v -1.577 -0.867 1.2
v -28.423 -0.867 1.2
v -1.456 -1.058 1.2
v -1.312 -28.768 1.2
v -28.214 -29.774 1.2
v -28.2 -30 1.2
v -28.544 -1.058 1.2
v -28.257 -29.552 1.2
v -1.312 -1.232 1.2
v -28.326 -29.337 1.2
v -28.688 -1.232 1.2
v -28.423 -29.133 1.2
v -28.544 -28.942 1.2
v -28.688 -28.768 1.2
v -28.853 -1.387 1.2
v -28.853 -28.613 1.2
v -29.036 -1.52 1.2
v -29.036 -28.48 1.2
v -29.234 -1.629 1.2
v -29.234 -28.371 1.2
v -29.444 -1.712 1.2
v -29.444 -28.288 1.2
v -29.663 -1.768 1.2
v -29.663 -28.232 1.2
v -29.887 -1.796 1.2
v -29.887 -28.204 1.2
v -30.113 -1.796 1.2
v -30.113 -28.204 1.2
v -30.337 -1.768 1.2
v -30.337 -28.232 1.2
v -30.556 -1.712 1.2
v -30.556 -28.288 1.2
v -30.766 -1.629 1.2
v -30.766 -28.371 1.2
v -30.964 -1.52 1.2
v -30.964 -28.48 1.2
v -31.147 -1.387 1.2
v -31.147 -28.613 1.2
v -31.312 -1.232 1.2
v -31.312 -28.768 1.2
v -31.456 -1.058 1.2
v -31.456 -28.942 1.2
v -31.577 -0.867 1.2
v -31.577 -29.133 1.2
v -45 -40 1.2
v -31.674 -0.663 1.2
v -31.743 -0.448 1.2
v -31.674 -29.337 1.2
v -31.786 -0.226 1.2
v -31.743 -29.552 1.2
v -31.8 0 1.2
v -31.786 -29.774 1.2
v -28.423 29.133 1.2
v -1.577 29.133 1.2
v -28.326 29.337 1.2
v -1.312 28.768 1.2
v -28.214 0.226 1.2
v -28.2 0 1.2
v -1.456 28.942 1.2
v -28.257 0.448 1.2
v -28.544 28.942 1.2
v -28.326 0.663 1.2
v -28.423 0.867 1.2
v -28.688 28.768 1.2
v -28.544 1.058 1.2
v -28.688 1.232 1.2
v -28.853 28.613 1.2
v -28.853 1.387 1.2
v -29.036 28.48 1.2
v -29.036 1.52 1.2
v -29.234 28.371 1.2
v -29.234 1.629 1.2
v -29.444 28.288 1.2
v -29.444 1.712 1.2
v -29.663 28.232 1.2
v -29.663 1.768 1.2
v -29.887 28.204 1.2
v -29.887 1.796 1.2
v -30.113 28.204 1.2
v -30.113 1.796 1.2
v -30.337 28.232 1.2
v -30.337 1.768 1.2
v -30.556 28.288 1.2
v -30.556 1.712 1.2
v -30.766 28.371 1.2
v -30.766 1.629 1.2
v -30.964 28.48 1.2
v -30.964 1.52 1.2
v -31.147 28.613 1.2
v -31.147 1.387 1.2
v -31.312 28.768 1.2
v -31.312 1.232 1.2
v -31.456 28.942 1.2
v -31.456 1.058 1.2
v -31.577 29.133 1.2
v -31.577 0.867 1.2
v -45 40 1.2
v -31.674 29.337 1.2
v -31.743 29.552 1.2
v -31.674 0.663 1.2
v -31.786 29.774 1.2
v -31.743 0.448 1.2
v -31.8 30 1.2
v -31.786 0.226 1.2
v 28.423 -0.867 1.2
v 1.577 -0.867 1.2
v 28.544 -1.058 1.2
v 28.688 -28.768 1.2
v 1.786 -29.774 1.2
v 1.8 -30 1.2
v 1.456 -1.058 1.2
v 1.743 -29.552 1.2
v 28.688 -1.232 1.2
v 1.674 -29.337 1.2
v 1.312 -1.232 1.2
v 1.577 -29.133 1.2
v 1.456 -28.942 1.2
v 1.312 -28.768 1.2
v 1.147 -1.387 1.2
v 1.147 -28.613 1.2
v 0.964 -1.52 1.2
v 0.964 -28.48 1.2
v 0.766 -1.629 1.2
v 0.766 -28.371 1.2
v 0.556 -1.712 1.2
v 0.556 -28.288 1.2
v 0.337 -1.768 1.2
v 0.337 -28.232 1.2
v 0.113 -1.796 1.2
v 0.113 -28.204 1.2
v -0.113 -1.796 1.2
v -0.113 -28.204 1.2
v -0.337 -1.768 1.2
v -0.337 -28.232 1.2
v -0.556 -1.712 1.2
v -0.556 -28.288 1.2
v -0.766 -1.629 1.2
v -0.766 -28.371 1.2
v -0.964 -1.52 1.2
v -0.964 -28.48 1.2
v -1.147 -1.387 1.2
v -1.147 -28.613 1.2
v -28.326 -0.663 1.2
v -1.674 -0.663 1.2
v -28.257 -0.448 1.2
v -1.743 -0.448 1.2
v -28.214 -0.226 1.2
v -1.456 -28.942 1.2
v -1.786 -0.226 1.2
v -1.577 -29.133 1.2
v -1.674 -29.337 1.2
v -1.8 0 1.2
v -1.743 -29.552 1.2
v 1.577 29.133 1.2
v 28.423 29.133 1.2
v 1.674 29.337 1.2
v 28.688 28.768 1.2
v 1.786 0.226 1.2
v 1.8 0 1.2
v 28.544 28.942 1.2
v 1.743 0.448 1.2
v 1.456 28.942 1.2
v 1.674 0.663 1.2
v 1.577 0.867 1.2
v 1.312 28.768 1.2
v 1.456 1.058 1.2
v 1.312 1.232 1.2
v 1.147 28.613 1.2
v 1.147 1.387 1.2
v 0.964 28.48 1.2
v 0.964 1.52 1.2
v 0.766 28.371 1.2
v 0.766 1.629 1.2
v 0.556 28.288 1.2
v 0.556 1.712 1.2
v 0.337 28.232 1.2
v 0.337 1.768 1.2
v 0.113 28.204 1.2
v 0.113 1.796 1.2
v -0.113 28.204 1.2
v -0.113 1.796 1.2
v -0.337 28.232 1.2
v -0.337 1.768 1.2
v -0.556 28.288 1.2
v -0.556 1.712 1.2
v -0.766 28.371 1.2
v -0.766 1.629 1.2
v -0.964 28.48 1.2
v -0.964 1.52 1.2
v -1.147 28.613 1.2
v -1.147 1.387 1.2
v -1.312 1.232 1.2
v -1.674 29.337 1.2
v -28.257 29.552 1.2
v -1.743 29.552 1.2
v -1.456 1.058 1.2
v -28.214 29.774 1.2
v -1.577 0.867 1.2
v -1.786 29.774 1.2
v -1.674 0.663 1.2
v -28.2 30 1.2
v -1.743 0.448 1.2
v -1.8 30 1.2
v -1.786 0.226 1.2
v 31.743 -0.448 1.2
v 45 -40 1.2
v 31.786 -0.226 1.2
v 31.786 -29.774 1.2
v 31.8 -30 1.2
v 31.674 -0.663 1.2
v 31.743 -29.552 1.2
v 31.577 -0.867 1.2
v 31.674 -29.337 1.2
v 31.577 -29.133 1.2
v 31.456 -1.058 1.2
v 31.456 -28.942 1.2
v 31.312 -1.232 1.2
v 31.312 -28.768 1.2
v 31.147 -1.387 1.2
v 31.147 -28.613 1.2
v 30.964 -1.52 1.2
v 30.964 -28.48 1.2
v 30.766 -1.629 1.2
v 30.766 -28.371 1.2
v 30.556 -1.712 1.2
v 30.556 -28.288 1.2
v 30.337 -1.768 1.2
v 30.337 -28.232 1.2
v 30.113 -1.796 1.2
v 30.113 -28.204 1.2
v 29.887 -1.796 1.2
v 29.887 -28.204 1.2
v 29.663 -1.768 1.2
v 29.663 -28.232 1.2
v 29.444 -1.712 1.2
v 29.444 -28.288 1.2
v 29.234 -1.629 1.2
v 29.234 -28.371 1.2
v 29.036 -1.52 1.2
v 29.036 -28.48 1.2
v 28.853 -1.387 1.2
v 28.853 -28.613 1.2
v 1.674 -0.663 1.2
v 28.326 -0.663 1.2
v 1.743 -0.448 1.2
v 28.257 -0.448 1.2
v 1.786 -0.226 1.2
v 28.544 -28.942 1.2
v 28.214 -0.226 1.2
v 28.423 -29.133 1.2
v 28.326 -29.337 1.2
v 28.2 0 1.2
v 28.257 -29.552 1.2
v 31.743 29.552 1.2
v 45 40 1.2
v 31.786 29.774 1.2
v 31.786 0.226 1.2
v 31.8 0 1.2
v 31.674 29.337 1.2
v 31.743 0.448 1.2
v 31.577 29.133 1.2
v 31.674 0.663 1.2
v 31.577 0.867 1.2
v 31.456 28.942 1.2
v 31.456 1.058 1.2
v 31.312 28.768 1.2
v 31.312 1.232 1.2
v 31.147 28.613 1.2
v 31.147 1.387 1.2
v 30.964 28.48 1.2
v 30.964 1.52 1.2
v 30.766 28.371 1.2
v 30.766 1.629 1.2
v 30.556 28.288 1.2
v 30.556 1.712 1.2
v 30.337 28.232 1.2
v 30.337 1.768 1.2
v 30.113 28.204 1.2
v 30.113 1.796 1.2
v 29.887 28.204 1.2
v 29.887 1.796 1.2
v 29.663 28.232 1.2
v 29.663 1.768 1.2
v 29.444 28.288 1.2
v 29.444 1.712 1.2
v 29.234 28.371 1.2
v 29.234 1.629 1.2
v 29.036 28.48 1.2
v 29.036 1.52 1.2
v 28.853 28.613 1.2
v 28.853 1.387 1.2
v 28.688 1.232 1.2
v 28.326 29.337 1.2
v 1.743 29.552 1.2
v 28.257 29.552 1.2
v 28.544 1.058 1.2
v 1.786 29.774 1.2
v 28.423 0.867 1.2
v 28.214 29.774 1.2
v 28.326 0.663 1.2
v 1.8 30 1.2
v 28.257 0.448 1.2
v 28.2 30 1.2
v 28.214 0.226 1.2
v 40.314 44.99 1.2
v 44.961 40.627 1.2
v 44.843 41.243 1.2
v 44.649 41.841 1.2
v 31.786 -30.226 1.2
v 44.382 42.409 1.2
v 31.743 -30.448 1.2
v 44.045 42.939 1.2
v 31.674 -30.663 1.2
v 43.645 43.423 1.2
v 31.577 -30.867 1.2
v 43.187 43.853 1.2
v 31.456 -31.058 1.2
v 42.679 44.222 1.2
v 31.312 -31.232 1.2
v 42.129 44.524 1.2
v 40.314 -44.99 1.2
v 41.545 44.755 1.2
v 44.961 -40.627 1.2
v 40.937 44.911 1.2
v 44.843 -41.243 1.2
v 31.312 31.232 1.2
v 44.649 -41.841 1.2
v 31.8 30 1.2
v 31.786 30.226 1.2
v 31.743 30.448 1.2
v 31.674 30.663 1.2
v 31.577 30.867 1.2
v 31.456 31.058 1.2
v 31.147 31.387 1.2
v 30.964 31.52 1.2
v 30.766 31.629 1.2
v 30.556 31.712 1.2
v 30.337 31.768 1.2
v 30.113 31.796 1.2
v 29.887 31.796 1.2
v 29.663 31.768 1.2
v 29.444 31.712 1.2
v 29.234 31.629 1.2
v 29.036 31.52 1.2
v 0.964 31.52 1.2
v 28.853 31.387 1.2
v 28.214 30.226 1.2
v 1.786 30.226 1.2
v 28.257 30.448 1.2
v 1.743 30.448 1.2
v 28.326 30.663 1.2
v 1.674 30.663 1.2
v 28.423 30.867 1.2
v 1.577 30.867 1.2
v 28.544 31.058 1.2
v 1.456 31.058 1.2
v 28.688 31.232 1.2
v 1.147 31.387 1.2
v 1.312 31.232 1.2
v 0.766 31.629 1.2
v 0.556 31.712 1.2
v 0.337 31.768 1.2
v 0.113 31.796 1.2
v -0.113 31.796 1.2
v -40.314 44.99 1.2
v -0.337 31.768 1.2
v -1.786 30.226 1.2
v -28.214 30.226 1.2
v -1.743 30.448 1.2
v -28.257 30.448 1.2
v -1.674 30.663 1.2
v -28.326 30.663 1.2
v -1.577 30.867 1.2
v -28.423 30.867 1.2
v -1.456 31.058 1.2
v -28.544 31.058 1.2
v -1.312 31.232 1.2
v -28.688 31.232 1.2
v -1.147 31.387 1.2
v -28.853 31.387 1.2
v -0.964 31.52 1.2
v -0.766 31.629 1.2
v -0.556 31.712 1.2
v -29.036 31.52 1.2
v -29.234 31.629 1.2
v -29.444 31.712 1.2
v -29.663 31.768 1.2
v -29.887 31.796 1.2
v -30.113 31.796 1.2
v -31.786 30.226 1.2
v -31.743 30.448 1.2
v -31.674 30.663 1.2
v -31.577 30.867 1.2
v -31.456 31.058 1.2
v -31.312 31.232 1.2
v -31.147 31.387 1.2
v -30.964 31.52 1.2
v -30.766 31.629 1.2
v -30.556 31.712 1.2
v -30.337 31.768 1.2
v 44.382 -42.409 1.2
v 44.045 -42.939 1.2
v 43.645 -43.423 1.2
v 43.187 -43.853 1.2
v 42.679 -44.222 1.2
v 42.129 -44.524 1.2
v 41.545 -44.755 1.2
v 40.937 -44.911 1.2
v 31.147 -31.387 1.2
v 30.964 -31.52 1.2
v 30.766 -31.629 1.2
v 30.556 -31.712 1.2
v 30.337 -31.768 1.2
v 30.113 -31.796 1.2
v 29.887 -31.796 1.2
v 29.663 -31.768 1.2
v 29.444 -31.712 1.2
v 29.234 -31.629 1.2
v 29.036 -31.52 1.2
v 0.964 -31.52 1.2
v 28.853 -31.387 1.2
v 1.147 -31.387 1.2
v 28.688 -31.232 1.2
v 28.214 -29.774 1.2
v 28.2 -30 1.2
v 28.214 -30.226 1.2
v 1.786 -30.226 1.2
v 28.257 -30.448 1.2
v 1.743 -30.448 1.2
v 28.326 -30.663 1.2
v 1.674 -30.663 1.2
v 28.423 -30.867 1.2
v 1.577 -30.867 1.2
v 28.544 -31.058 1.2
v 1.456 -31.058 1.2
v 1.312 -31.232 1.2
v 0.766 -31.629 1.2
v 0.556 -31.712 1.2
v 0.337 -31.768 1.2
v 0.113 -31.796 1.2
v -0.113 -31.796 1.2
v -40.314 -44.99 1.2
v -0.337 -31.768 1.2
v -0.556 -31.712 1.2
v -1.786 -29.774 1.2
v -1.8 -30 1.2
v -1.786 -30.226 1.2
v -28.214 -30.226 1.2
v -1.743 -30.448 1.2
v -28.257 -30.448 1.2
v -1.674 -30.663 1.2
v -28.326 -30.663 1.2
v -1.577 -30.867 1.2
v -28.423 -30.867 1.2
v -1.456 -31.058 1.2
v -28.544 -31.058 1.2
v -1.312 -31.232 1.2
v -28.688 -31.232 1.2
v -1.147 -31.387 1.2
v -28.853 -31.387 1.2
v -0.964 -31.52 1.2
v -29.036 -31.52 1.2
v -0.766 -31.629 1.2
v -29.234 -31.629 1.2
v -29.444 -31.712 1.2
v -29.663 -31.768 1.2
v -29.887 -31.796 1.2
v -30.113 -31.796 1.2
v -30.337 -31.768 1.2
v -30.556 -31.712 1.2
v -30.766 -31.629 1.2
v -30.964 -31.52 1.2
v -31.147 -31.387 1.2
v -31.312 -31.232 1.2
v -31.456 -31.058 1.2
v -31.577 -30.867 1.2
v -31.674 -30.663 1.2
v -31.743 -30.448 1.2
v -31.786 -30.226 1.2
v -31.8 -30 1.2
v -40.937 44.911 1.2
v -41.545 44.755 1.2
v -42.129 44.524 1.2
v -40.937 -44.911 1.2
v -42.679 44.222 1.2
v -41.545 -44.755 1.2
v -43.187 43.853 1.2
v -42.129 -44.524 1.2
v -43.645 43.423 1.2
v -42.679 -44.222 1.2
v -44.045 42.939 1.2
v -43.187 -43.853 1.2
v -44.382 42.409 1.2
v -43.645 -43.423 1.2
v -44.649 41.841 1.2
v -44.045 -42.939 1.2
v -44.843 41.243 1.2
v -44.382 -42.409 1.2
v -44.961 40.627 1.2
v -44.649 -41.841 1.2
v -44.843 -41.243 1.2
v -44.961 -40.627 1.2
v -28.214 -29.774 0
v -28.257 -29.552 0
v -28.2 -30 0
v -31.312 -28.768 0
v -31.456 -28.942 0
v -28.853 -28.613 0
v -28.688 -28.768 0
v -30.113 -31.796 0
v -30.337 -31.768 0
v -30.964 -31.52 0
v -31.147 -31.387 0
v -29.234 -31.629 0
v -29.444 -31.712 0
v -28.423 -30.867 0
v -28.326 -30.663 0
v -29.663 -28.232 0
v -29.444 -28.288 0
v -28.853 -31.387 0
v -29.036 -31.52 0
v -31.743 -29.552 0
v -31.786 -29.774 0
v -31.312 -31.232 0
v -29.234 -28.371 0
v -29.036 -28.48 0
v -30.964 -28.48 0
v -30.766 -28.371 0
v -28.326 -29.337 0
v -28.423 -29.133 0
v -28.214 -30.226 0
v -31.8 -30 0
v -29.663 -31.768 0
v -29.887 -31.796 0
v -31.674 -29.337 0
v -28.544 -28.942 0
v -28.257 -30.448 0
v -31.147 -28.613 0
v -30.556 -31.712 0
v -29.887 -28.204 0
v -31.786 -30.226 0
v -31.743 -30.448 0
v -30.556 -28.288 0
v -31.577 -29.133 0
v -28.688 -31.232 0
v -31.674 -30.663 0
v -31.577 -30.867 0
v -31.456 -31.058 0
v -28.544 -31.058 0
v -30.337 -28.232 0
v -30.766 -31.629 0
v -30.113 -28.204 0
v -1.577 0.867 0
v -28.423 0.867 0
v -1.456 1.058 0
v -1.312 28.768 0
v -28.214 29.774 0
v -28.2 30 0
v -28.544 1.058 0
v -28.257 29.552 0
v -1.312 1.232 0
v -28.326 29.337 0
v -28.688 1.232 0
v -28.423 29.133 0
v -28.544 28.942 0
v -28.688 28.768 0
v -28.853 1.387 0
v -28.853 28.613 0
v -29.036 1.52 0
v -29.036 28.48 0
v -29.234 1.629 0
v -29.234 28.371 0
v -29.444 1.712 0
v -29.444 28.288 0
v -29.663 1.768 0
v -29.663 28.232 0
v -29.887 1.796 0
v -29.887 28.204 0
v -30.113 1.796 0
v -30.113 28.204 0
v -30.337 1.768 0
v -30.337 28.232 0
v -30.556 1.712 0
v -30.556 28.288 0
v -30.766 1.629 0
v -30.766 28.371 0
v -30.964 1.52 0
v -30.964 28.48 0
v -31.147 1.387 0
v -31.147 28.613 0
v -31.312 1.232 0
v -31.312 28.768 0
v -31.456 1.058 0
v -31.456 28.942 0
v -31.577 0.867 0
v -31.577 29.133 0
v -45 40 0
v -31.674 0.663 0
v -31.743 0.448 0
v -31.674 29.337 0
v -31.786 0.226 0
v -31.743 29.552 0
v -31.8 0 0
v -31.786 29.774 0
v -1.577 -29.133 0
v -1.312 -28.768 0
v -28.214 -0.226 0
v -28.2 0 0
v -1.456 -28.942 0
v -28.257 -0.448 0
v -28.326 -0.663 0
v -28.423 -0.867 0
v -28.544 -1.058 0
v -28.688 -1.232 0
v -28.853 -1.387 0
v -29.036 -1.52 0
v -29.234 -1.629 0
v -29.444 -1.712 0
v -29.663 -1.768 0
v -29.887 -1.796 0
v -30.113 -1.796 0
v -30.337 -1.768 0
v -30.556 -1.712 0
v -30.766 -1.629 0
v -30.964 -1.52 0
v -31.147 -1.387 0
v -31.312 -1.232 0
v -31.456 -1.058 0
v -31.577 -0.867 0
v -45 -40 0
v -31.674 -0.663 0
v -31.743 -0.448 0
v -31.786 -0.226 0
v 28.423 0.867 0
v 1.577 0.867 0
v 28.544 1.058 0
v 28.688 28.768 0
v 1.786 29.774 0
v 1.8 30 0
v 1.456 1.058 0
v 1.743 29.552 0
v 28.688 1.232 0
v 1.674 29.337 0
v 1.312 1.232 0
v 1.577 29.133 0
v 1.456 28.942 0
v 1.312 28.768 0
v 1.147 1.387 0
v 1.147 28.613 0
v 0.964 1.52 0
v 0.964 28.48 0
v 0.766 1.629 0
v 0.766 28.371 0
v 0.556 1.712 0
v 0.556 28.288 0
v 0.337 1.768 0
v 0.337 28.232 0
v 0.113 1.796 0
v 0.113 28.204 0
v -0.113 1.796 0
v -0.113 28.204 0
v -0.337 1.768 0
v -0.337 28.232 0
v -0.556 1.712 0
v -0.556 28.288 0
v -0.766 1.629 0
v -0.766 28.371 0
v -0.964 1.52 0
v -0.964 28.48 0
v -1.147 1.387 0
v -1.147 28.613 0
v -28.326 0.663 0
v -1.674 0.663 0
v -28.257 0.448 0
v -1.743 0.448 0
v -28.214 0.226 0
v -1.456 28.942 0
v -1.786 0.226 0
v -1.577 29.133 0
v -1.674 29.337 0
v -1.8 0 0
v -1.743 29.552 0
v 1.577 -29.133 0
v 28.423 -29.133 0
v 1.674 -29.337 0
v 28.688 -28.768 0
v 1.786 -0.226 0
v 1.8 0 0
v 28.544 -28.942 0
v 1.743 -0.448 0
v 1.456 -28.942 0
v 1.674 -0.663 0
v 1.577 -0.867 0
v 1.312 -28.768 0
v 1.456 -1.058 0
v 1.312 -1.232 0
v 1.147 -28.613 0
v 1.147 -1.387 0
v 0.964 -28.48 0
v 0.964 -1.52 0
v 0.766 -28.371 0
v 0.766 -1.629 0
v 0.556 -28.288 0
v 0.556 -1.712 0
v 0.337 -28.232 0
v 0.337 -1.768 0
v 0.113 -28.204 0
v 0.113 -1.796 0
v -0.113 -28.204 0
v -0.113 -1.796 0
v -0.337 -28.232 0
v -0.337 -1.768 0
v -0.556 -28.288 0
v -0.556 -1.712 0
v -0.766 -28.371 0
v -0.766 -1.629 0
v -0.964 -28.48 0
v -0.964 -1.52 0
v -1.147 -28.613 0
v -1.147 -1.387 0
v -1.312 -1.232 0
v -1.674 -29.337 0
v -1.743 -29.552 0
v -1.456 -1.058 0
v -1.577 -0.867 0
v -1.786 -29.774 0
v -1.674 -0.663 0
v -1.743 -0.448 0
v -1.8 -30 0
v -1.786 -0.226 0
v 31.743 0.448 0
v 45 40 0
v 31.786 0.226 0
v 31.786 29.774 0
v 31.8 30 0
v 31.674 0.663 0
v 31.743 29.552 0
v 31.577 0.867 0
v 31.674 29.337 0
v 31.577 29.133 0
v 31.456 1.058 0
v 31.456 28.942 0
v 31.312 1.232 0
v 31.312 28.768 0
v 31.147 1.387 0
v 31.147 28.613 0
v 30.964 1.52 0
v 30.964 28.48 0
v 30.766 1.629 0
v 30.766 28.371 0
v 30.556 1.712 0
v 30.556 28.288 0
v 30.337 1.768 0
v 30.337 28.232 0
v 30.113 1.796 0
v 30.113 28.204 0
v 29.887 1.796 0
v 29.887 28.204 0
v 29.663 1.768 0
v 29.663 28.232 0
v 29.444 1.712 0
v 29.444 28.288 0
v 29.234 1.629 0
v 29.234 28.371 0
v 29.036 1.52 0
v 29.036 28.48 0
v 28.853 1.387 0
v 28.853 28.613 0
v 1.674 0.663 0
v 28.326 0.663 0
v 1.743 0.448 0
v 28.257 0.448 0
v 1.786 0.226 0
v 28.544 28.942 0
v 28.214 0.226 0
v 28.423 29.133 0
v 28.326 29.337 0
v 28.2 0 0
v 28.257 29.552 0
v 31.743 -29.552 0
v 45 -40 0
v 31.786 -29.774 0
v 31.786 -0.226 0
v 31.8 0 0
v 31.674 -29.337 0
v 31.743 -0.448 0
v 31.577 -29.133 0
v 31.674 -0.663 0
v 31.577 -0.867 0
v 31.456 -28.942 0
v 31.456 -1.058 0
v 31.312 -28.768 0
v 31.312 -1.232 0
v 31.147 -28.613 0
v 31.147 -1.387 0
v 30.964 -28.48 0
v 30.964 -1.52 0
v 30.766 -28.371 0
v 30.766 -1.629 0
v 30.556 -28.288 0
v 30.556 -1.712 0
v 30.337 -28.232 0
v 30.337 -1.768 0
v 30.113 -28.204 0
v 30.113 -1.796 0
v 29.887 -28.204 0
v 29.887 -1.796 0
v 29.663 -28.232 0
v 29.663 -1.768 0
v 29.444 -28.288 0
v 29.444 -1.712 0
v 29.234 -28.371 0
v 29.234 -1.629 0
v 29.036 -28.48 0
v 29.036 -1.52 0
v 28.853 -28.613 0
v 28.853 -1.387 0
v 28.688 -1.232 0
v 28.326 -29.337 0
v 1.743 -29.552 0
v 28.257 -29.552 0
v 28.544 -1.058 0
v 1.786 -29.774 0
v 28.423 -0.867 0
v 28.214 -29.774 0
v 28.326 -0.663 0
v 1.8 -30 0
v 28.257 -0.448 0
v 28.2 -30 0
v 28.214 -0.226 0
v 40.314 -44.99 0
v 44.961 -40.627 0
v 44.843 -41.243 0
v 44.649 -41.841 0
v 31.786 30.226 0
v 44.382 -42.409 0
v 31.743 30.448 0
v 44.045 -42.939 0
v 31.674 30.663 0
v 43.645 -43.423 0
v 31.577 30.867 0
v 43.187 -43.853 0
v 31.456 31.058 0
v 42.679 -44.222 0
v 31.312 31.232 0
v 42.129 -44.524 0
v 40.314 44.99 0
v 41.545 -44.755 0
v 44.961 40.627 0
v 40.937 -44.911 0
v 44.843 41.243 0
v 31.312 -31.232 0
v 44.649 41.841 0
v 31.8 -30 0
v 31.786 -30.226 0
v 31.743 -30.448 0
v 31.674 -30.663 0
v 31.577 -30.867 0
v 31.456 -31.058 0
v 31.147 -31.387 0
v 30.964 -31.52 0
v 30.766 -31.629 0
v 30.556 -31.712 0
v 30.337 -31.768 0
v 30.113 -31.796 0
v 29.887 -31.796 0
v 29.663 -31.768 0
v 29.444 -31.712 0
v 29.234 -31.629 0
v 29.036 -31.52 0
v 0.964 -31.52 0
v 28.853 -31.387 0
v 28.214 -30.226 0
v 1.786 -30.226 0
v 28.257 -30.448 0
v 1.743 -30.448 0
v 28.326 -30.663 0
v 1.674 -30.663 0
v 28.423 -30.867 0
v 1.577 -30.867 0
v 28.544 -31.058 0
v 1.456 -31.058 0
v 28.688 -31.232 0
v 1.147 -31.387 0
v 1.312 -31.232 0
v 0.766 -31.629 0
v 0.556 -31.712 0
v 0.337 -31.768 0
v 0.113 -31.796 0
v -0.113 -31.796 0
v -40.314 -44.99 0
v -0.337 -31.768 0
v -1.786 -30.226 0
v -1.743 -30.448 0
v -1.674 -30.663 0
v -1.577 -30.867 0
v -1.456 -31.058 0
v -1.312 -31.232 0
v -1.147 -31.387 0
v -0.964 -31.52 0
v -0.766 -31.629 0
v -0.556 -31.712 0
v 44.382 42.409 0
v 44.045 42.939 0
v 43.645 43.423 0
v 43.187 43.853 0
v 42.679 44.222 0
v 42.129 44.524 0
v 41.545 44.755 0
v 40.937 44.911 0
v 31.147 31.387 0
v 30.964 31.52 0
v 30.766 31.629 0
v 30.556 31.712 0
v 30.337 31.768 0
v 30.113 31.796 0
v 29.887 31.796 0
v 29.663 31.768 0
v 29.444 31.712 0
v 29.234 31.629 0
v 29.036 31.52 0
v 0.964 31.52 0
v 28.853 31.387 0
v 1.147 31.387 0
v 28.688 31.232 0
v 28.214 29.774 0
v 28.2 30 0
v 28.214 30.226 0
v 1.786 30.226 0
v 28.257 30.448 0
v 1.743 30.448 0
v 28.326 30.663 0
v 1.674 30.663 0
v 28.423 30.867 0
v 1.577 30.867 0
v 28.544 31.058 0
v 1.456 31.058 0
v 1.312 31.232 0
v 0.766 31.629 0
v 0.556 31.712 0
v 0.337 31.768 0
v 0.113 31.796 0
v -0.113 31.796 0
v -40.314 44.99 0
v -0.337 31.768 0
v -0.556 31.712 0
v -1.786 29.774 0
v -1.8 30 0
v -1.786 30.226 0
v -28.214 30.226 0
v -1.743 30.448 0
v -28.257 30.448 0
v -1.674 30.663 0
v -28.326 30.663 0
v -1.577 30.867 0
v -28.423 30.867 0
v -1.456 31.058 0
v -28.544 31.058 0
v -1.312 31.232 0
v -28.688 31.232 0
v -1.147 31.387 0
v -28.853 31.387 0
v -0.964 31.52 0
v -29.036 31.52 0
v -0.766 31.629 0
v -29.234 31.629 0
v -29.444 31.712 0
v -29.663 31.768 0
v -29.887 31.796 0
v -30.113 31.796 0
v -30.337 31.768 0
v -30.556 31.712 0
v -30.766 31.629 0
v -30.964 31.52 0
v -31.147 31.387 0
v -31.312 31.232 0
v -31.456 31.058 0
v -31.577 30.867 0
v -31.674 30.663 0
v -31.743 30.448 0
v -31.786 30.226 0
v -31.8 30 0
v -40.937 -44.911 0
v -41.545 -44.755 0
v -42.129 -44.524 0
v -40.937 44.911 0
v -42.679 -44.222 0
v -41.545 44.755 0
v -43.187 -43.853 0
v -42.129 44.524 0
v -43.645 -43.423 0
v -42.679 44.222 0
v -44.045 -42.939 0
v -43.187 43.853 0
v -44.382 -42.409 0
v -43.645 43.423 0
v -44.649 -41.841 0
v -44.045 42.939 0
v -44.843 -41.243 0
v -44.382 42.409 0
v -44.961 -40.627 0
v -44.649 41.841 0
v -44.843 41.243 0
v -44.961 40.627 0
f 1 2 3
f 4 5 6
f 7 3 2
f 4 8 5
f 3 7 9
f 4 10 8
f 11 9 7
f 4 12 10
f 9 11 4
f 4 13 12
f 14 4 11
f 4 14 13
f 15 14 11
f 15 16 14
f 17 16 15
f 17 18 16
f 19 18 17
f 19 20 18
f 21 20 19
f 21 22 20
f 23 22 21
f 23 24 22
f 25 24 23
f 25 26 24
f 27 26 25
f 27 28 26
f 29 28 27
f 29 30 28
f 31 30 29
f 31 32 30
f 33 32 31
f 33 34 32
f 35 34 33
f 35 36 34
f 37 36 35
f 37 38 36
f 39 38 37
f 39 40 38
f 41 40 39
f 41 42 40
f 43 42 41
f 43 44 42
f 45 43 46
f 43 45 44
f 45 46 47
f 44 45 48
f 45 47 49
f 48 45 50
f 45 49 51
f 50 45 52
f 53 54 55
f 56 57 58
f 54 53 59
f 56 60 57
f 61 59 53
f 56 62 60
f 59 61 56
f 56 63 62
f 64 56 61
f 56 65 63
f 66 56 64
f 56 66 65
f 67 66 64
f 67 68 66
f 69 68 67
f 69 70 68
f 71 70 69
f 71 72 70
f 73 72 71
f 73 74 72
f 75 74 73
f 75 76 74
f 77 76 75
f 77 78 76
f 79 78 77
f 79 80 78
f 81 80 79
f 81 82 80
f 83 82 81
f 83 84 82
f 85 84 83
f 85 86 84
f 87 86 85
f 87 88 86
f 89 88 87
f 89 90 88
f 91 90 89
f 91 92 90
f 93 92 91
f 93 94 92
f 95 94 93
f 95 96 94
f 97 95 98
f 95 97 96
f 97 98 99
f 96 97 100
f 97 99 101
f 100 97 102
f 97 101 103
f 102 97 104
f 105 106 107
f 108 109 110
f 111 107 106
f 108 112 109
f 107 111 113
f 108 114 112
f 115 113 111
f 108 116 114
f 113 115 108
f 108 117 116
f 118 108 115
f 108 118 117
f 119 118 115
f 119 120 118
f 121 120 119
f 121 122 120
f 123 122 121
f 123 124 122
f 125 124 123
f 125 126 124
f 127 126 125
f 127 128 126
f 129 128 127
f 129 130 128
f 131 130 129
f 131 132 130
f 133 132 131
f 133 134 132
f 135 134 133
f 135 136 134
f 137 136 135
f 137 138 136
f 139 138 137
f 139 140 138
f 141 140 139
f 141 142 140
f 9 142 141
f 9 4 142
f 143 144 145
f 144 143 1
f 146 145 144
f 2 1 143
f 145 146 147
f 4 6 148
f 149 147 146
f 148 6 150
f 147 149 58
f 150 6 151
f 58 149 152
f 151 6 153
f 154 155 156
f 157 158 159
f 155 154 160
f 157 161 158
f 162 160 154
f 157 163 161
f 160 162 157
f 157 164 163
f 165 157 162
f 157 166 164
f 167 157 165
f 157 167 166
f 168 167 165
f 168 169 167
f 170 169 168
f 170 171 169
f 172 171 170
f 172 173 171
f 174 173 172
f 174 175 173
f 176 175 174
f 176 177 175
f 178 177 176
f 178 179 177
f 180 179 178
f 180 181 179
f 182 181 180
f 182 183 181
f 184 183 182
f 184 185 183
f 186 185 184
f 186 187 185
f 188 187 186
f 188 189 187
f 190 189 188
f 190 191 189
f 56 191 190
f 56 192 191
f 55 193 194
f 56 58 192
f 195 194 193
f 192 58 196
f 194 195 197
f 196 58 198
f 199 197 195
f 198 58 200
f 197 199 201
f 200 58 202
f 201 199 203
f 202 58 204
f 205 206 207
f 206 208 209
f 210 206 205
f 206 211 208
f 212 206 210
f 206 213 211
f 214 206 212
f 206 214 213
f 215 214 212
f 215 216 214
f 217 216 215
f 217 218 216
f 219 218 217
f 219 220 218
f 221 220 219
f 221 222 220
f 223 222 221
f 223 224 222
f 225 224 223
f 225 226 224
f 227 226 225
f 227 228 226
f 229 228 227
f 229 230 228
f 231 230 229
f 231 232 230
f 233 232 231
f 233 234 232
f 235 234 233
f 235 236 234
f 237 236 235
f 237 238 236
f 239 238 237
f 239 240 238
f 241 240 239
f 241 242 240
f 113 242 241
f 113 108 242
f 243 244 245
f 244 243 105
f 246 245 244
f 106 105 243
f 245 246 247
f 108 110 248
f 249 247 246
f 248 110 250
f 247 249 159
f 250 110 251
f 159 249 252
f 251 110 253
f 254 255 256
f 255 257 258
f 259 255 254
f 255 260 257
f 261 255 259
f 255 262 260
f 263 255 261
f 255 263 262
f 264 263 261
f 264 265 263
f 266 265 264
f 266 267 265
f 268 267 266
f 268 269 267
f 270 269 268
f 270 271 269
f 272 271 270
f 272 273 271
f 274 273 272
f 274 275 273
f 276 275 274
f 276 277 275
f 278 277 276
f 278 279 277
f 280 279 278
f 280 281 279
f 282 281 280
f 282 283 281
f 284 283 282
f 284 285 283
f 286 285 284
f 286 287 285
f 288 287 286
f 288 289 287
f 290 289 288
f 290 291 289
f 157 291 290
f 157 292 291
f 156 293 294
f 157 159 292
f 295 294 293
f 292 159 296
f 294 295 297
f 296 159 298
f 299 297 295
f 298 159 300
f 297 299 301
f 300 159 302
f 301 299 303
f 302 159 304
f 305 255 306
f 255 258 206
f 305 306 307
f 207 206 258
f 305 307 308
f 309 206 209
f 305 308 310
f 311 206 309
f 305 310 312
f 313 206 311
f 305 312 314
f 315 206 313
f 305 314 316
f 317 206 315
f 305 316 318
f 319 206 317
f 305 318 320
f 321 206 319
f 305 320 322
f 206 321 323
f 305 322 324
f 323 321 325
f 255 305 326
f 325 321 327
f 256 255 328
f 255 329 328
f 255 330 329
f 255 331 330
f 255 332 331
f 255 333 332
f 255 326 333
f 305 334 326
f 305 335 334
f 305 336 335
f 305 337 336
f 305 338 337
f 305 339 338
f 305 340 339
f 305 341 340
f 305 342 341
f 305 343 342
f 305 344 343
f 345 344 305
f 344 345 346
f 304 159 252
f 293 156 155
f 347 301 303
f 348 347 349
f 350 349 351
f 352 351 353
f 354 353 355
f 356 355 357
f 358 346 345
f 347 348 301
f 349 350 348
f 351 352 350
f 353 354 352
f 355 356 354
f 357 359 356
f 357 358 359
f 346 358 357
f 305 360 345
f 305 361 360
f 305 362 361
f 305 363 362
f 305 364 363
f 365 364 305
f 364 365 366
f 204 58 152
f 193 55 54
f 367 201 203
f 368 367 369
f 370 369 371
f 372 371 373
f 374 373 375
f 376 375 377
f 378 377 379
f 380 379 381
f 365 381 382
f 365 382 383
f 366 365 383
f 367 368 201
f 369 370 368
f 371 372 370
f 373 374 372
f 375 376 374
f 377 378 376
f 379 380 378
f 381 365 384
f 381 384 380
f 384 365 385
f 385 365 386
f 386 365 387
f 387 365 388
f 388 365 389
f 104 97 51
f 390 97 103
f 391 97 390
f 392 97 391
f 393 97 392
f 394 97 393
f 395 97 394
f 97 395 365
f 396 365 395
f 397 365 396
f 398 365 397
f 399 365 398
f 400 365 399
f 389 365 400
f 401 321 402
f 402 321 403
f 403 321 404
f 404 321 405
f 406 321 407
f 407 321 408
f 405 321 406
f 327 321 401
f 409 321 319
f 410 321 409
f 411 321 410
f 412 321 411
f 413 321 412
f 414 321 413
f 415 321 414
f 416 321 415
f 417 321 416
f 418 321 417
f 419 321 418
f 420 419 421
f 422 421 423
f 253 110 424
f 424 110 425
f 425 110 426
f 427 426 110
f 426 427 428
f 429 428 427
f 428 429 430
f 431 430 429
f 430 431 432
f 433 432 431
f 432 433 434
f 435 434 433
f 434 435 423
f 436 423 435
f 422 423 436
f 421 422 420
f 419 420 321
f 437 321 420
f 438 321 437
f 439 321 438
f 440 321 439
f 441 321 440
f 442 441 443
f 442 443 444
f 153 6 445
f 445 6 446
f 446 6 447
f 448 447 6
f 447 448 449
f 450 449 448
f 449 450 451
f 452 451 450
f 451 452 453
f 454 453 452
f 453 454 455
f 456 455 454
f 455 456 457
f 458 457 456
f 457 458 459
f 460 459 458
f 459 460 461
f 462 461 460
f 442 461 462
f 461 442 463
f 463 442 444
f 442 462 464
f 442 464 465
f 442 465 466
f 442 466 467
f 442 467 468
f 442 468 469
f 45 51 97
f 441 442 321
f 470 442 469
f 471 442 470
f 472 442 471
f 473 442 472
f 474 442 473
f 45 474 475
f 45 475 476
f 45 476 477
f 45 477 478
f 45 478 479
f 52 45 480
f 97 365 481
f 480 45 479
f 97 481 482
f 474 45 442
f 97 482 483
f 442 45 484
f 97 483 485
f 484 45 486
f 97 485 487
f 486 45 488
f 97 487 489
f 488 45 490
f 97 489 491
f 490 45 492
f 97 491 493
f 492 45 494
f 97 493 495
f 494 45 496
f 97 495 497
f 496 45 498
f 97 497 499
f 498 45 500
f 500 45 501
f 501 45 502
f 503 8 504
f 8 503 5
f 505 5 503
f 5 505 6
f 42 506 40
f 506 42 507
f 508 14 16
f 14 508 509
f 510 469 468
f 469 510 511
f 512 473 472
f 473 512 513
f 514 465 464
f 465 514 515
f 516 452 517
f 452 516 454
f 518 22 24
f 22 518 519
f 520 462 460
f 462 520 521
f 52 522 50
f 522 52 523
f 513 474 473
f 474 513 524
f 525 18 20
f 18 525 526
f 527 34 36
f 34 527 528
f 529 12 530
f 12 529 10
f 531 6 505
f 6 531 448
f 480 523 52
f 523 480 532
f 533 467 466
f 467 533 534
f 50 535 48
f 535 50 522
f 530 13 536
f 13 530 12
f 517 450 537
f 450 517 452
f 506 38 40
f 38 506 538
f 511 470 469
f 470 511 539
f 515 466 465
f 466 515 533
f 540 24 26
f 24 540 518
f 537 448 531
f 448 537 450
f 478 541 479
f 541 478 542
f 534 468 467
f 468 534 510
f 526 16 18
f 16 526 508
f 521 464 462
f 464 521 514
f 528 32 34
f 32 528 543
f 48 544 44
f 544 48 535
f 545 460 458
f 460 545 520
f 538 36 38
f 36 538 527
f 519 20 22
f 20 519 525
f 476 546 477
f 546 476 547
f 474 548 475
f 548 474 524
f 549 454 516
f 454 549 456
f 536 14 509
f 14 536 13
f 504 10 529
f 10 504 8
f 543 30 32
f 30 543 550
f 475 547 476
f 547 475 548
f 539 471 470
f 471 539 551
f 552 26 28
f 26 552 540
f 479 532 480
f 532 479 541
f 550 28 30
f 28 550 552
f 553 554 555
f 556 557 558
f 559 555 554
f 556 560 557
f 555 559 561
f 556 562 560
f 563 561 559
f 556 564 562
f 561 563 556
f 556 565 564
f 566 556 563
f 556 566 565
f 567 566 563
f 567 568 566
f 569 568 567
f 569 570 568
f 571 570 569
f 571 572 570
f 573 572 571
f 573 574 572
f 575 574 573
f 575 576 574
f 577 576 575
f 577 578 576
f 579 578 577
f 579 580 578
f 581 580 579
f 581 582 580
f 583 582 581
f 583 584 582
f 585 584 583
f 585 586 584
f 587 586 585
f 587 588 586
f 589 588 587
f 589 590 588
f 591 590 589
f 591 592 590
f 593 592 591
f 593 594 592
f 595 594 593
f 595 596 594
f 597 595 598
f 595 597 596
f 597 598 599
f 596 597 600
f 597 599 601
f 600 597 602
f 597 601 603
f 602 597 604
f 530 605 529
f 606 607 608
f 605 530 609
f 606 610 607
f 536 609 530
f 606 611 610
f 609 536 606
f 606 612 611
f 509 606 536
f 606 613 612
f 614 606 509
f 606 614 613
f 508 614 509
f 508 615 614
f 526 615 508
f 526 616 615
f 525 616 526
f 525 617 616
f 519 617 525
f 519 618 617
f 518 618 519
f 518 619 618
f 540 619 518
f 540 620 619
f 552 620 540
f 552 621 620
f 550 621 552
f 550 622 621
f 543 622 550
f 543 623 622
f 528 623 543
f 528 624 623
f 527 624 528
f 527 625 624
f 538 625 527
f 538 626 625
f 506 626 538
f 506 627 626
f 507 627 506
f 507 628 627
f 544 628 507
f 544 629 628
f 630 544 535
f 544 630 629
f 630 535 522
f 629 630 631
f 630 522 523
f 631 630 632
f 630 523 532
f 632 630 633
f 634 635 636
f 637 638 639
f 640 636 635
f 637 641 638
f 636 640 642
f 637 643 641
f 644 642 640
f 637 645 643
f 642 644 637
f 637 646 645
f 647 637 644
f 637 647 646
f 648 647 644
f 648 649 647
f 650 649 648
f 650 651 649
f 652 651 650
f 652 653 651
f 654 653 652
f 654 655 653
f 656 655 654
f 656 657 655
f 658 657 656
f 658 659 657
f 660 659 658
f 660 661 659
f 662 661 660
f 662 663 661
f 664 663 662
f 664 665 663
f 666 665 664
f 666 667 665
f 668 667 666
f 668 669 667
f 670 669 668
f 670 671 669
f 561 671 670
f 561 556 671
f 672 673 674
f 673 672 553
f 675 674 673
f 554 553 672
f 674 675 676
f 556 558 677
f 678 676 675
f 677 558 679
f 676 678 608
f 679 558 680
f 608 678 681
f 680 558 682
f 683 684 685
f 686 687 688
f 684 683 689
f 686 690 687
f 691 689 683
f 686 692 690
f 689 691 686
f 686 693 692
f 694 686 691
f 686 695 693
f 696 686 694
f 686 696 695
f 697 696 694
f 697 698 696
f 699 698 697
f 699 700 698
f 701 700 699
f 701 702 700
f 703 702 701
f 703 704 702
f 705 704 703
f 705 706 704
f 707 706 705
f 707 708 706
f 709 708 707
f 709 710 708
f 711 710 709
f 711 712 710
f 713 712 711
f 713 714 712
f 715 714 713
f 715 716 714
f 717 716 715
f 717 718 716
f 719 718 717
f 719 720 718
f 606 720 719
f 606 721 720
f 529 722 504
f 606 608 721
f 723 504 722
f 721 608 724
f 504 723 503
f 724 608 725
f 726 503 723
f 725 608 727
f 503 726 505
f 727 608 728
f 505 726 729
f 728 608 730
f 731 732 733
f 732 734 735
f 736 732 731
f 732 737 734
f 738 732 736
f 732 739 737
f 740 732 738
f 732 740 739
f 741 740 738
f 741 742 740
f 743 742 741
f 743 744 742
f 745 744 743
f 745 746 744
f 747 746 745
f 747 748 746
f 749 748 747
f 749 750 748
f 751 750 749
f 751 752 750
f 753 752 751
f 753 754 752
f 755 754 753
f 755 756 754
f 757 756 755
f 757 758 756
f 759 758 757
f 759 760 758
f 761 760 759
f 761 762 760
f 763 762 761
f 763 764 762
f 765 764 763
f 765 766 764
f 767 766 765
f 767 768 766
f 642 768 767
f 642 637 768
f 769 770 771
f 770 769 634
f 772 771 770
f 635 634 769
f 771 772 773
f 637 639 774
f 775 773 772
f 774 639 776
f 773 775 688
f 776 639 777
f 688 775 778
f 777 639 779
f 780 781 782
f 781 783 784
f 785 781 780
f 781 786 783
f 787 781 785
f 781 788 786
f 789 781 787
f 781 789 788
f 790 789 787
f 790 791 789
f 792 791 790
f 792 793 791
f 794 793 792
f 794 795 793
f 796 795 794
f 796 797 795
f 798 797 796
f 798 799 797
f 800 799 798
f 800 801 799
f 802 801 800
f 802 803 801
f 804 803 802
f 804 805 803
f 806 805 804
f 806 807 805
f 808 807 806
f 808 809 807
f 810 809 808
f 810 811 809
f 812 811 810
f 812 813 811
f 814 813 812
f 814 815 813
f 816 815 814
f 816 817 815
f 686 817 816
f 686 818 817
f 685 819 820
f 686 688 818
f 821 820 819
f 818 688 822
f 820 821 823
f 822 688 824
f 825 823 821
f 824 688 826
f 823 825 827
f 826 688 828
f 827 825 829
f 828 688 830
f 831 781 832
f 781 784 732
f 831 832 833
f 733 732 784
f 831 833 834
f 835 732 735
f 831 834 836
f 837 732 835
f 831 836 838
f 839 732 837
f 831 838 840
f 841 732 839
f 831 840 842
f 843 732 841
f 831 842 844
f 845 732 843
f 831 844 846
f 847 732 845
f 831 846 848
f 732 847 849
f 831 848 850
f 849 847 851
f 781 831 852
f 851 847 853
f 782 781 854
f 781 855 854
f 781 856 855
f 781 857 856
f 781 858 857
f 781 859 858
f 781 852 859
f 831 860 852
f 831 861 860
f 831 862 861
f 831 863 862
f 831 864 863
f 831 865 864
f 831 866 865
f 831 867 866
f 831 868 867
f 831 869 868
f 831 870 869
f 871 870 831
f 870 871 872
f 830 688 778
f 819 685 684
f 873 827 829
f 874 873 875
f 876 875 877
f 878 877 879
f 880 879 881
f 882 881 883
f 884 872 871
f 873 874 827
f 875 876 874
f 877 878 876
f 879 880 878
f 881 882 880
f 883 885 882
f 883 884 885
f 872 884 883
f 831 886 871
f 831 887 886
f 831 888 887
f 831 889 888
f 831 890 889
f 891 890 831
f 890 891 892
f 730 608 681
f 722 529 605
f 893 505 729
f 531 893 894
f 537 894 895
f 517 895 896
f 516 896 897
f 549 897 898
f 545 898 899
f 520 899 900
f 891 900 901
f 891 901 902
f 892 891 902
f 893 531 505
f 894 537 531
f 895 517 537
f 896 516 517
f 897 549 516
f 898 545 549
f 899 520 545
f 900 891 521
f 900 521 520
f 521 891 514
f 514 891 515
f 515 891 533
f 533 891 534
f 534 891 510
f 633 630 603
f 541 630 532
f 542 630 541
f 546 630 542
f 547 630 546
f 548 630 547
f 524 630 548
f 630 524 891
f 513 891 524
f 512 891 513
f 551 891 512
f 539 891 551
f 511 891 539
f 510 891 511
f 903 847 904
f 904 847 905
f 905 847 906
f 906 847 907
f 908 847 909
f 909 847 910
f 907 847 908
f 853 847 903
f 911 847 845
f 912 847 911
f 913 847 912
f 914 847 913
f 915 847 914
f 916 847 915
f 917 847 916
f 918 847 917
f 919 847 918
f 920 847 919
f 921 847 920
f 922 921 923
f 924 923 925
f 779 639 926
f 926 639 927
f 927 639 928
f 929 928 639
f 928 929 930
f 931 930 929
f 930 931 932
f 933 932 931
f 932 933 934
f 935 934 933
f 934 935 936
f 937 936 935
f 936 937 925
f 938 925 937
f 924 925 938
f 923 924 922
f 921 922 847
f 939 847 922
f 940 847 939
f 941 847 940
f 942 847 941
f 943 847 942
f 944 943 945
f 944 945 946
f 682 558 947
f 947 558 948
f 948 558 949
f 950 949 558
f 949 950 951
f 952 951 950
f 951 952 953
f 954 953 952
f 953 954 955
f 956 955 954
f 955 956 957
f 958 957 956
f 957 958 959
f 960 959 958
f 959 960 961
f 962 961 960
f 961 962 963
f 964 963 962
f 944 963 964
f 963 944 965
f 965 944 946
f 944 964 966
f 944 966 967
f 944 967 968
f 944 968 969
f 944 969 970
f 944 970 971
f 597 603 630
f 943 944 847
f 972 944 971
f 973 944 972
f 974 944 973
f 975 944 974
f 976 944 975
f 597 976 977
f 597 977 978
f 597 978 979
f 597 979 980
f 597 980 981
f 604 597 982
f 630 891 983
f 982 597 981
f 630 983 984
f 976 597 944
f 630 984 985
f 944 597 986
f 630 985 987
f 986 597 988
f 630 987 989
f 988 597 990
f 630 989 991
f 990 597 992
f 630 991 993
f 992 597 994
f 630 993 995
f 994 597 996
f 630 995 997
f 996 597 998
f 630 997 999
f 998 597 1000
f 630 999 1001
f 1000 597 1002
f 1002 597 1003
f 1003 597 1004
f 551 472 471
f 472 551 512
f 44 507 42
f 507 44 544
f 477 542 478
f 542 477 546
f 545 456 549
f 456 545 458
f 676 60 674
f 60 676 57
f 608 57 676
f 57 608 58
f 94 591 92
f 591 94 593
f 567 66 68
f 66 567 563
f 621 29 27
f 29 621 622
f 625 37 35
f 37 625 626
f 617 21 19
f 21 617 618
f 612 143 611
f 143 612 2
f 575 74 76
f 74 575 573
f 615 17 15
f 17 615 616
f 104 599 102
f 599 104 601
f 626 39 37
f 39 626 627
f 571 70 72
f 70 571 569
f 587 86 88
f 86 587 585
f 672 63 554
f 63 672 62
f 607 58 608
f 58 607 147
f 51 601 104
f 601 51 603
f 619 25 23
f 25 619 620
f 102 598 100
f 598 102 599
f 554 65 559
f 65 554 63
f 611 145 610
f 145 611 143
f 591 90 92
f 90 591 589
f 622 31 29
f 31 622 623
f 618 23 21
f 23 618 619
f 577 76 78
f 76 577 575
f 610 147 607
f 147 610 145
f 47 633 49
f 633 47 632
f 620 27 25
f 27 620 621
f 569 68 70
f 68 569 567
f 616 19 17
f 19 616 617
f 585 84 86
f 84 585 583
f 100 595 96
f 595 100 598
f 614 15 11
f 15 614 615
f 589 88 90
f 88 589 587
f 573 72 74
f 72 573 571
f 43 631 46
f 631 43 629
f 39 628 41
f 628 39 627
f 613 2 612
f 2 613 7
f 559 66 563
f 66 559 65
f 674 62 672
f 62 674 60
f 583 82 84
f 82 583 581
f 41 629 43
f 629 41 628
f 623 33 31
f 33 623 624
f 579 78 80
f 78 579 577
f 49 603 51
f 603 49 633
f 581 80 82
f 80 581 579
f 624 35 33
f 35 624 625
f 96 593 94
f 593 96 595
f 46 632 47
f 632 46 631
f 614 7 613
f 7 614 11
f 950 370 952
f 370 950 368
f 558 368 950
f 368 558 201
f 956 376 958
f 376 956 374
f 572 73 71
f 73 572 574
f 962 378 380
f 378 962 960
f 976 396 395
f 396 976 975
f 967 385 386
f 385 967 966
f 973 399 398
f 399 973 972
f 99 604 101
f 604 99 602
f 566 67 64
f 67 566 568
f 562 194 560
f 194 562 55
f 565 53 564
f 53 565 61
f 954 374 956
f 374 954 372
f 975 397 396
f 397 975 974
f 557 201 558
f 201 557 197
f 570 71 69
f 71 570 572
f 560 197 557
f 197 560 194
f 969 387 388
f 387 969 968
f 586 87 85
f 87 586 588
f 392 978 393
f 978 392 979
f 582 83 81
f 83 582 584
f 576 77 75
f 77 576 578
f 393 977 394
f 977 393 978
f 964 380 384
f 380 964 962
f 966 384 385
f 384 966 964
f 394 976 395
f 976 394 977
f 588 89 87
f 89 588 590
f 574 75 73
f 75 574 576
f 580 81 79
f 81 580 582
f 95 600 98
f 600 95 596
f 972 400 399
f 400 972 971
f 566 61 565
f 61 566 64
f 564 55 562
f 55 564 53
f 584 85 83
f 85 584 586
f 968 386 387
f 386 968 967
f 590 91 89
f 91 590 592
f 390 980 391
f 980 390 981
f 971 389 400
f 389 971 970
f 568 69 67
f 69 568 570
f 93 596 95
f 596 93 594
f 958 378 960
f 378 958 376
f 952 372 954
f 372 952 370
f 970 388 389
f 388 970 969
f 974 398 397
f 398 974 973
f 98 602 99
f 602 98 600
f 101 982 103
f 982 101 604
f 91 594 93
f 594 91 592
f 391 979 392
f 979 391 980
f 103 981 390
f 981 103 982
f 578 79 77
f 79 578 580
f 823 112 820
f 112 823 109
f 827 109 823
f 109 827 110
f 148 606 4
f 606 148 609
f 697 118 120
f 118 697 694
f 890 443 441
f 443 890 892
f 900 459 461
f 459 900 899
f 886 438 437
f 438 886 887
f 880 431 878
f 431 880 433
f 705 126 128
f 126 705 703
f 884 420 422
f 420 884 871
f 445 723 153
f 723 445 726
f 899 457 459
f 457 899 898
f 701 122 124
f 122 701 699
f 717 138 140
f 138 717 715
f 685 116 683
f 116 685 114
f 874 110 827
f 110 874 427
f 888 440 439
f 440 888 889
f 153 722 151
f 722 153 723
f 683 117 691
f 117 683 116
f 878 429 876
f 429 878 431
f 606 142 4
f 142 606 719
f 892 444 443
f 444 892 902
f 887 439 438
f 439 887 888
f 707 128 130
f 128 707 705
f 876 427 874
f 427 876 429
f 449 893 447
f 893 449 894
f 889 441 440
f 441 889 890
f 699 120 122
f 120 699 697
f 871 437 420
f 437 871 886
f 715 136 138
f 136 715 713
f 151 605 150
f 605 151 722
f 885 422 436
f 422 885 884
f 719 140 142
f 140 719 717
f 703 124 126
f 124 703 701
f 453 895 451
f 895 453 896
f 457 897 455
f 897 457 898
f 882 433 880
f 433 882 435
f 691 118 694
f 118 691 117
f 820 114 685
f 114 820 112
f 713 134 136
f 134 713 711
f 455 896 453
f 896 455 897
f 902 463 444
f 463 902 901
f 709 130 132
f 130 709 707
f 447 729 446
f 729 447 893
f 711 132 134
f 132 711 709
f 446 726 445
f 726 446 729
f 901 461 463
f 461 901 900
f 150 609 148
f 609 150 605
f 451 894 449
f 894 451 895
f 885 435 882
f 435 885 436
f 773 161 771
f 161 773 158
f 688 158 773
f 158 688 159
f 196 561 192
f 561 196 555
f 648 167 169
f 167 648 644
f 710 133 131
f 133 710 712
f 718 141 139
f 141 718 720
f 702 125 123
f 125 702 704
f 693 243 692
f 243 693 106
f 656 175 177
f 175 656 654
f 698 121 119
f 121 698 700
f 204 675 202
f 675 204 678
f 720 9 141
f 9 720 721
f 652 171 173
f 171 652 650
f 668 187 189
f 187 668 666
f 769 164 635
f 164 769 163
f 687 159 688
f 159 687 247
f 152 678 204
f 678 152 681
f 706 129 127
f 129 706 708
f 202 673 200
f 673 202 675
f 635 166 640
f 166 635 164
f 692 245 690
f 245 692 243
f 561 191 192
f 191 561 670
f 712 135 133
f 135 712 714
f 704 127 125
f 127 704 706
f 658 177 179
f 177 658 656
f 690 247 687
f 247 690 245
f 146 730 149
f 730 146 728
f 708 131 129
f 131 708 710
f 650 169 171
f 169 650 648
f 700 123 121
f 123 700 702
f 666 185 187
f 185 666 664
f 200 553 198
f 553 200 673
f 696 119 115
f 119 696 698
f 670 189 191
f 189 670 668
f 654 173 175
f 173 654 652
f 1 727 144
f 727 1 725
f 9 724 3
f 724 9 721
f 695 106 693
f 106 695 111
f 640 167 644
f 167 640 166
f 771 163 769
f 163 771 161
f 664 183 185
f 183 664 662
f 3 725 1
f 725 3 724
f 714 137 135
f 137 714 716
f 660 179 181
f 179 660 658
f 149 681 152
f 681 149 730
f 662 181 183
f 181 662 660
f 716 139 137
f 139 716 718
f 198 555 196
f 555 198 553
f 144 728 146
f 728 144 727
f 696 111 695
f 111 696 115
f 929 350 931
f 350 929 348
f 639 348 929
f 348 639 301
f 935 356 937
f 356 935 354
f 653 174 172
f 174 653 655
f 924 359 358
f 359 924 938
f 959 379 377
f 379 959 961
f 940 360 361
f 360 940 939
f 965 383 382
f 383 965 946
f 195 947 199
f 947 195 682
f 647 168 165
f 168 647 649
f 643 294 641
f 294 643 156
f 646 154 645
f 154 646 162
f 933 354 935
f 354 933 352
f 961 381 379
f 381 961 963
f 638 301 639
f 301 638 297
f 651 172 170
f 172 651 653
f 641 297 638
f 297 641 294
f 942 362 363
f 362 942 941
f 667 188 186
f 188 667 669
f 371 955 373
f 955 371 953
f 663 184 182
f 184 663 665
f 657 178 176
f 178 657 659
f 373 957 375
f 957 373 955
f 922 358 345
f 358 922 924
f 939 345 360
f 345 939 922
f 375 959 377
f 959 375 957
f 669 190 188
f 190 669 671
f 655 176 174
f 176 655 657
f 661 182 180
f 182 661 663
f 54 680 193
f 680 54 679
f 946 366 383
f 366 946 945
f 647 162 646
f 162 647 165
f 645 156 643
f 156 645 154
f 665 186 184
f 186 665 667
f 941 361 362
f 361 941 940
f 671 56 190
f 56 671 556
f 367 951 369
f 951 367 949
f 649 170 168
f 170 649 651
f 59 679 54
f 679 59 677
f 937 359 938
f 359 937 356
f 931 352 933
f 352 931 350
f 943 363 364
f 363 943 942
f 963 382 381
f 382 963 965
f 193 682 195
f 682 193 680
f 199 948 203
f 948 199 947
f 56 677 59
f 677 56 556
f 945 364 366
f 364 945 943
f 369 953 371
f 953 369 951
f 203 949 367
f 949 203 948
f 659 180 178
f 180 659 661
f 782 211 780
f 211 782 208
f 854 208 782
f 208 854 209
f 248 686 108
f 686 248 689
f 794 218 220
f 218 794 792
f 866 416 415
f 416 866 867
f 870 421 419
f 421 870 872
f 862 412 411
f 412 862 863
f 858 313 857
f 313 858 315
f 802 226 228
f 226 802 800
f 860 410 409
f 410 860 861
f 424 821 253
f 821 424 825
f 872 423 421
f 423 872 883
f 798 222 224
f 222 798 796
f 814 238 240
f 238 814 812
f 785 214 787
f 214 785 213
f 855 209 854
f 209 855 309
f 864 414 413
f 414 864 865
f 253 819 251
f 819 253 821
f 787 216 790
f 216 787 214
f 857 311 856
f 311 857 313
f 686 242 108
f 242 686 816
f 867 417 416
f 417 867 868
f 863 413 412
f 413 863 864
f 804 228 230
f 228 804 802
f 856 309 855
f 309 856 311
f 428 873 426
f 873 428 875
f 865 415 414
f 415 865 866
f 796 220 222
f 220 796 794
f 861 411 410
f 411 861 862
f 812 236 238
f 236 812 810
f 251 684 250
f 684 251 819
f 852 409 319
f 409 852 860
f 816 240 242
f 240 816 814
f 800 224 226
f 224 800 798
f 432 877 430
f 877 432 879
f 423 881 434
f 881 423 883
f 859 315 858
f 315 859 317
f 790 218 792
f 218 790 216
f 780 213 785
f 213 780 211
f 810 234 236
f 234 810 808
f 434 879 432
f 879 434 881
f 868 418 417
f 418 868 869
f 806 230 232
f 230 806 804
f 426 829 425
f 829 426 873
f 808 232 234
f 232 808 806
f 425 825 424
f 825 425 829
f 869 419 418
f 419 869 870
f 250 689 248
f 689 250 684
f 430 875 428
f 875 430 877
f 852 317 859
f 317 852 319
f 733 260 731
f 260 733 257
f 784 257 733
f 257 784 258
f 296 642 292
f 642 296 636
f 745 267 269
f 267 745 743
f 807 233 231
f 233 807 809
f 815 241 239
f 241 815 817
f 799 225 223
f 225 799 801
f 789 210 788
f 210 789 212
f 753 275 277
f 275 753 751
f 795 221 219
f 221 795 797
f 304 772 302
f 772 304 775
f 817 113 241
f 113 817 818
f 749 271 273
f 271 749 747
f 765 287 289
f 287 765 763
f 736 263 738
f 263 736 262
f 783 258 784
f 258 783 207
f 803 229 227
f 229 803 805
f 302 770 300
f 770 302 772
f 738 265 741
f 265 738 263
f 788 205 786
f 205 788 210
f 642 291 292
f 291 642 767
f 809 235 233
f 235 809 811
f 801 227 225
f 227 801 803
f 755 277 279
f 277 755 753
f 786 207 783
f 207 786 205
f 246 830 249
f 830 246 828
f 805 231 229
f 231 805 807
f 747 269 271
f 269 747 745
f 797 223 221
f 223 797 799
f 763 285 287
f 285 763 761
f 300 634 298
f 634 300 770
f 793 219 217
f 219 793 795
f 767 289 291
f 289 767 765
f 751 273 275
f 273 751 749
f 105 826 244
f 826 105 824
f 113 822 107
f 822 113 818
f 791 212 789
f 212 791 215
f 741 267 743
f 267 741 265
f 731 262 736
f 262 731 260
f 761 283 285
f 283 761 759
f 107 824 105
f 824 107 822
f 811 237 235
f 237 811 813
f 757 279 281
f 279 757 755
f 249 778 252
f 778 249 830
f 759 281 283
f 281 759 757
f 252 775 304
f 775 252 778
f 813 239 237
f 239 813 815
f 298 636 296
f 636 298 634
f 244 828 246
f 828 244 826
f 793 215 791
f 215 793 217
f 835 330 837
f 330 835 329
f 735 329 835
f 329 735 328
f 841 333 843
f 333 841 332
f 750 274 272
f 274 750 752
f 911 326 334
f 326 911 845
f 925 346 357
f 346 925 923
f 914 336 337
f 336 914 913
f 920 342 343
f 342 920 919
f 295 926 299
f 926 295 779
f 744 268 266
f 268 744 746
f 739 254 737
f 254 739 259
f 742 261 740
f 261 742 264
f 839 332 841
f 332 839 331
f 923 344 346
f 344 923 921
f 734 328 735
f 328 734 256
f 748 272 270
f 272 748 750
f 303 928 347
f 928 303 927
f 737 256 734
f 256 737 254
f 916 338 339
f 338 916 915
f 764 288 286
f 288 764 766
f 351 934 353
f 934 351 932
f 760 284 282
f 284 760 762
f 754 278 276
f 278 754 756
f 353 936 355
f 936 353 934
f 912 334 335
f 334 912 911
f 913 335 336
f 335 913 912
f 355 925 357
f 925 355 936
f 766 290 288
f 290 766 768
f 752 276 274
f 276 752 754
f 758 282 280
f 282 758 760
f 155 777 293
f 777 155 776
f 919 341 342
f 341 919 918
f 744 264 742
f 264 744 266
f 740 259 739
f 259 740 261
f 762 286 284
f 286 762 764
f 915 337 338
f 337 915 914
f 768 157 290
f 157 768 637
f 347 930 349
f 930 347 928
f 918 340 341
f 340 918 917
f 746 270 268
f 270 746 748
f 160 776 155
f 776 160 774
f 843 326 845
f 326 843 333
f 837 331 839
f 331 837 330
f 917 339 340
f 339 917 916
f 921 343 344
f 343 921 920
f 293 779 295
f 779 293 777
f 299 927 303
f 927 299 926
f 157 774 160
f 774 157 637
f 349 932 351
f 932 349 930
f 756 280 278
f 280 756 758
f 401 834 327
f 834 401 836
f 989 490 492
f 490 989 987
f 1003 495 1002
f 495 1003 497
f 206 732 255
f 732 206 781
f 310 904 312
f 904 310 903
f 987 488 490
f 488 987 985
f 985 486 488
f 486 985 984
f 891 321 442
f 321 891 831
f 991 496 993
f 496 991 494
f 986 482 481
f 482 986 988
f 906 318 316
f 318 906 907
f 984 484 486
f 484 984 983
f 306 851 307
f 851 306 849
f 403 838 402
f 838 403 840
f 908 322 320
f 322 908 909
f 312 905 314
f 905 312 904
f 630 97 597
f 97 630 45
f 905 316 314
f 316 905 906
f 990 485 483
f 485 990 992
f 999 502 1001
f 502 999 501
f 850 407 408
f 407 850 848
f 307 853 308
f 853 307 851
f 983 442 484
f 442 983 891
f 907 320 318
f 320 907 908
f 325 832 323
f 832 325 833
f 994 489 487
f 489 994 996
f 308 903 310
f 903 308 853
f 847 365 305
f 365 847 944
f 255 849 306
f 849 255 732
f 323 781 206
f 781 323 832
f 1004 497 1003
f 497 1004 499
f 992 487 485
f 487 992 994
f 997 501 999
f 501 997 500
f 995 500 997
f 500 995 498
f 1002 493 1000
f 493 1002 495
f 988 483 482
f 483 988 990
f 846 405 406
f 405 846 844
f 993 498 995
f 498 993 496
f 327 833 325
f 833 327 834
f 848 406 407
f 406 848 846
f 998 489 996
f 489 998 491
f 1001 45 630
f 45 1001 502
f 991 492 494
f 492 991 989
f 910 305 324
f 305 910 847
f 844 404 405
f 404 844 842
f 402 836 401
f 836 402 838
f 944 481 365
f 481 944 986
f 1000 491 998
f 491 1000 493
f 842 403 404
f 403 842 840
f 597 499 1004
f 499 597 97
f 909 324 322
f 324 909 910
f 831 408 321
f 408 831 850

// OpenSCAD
$fn = 50;


difference() {
	union() {
		hull() {
			translate(v = [-40.0000000000, 40.0000000000, 0]) {
				cylinder(h = 99, r = 5);
			}
			translate(v = [40.0000000000, 40.0000000000, 0]) {
				cylinder(h = 99, r = 5);
			}
			translate(v = [-40.0000000000, -40.0000000000, 0]) {
				cylinder(h = 99, r = 5);
			}
			translate(v = [40.0000000000, -40.0000000000, 0]) {
				cylinder(h = 99, r = 5);
			}
		}
	}
	union() {
		translate(v = [0, 0, 1.2000000000]) {
			hull() {
				translate(v = [-40.0000000000, 40.0000000000, 0]) {
					cylinder(h = 97.8000000000, r = 3.8000000000);
				}
				translate(v = [40.0000000000, 40.0000000000, 0]) {
					cylinder(h = 97.8000000000, r = 3.8000000000);
				}
				translate(v = [-40.0000000000, -40.0000000000, 0]) {
					cylinder(h = 97.8000000000, r = 3.8000000000);
				}
				translate(v = [40.0000000000, -40.0000000000, 0]) {
					cylinder(h = 97.8000000000, r = 3.8000000000);
				}
			}
		}
		#translate(v = [-30.0000000000, -30.0000000000, 0]) {
			cylinder(h = 1.2000000000, r = 1.8000000000);
		}
		#translate(v = [-30.0000000000, 0.0000000000, 0]) {
			cylinder(h = 1.2000000000, r = 1.8000000000);
		}
		#translate(v = [-30.0000000000, 30.0000000000, 0]) {
			cylinder(h = 1.2000000000, r = 1.8000000000);
		}
		#translate(v = [0.0000000000, -30.0000000000, 0]) {
			cylinder(h = 1.2000000000, r = 1.8000000000);
		}
		#cylinder(h = 1.2000000000, r = 1.8000000000);
		#translate(v = [0.0000000000, 30.0000000000, 0]) {
			cylinder(h = 1.2000000000, r = 1.8000000000);
		}
		#translate(v = [30.0000000000, -30.0000000000, 0]) {
			cylinder(h = 1.2000000000, r = 1.8000000000);
		}
		#translate(v = [30.0000000000, 0.0000000000, 0]) {
			cylinder(h = 1.2000000000, r = 1.8000000000);
		}
		#translate(v = [30.0000000000, 30.0000000000, 0]) {
			cylinder(h = 1.2000000000, r = 1.8000000000);
		}
		translate(v = [-250.0000000000, -250.0000000000, 1.2000000000]) {
			cube(size = [500, 500, 500]);
		}
		translate(v = [-250.0000000000, -250.0000000000, 1.2000000000]) {
			cube(size = [500, 500, 500]);
		}
		translate(v = [-250.0000000000, -250.0000000000, 1.2000000000]) {
			cube(size = [500, 500, 500]);
		}
	}
}
